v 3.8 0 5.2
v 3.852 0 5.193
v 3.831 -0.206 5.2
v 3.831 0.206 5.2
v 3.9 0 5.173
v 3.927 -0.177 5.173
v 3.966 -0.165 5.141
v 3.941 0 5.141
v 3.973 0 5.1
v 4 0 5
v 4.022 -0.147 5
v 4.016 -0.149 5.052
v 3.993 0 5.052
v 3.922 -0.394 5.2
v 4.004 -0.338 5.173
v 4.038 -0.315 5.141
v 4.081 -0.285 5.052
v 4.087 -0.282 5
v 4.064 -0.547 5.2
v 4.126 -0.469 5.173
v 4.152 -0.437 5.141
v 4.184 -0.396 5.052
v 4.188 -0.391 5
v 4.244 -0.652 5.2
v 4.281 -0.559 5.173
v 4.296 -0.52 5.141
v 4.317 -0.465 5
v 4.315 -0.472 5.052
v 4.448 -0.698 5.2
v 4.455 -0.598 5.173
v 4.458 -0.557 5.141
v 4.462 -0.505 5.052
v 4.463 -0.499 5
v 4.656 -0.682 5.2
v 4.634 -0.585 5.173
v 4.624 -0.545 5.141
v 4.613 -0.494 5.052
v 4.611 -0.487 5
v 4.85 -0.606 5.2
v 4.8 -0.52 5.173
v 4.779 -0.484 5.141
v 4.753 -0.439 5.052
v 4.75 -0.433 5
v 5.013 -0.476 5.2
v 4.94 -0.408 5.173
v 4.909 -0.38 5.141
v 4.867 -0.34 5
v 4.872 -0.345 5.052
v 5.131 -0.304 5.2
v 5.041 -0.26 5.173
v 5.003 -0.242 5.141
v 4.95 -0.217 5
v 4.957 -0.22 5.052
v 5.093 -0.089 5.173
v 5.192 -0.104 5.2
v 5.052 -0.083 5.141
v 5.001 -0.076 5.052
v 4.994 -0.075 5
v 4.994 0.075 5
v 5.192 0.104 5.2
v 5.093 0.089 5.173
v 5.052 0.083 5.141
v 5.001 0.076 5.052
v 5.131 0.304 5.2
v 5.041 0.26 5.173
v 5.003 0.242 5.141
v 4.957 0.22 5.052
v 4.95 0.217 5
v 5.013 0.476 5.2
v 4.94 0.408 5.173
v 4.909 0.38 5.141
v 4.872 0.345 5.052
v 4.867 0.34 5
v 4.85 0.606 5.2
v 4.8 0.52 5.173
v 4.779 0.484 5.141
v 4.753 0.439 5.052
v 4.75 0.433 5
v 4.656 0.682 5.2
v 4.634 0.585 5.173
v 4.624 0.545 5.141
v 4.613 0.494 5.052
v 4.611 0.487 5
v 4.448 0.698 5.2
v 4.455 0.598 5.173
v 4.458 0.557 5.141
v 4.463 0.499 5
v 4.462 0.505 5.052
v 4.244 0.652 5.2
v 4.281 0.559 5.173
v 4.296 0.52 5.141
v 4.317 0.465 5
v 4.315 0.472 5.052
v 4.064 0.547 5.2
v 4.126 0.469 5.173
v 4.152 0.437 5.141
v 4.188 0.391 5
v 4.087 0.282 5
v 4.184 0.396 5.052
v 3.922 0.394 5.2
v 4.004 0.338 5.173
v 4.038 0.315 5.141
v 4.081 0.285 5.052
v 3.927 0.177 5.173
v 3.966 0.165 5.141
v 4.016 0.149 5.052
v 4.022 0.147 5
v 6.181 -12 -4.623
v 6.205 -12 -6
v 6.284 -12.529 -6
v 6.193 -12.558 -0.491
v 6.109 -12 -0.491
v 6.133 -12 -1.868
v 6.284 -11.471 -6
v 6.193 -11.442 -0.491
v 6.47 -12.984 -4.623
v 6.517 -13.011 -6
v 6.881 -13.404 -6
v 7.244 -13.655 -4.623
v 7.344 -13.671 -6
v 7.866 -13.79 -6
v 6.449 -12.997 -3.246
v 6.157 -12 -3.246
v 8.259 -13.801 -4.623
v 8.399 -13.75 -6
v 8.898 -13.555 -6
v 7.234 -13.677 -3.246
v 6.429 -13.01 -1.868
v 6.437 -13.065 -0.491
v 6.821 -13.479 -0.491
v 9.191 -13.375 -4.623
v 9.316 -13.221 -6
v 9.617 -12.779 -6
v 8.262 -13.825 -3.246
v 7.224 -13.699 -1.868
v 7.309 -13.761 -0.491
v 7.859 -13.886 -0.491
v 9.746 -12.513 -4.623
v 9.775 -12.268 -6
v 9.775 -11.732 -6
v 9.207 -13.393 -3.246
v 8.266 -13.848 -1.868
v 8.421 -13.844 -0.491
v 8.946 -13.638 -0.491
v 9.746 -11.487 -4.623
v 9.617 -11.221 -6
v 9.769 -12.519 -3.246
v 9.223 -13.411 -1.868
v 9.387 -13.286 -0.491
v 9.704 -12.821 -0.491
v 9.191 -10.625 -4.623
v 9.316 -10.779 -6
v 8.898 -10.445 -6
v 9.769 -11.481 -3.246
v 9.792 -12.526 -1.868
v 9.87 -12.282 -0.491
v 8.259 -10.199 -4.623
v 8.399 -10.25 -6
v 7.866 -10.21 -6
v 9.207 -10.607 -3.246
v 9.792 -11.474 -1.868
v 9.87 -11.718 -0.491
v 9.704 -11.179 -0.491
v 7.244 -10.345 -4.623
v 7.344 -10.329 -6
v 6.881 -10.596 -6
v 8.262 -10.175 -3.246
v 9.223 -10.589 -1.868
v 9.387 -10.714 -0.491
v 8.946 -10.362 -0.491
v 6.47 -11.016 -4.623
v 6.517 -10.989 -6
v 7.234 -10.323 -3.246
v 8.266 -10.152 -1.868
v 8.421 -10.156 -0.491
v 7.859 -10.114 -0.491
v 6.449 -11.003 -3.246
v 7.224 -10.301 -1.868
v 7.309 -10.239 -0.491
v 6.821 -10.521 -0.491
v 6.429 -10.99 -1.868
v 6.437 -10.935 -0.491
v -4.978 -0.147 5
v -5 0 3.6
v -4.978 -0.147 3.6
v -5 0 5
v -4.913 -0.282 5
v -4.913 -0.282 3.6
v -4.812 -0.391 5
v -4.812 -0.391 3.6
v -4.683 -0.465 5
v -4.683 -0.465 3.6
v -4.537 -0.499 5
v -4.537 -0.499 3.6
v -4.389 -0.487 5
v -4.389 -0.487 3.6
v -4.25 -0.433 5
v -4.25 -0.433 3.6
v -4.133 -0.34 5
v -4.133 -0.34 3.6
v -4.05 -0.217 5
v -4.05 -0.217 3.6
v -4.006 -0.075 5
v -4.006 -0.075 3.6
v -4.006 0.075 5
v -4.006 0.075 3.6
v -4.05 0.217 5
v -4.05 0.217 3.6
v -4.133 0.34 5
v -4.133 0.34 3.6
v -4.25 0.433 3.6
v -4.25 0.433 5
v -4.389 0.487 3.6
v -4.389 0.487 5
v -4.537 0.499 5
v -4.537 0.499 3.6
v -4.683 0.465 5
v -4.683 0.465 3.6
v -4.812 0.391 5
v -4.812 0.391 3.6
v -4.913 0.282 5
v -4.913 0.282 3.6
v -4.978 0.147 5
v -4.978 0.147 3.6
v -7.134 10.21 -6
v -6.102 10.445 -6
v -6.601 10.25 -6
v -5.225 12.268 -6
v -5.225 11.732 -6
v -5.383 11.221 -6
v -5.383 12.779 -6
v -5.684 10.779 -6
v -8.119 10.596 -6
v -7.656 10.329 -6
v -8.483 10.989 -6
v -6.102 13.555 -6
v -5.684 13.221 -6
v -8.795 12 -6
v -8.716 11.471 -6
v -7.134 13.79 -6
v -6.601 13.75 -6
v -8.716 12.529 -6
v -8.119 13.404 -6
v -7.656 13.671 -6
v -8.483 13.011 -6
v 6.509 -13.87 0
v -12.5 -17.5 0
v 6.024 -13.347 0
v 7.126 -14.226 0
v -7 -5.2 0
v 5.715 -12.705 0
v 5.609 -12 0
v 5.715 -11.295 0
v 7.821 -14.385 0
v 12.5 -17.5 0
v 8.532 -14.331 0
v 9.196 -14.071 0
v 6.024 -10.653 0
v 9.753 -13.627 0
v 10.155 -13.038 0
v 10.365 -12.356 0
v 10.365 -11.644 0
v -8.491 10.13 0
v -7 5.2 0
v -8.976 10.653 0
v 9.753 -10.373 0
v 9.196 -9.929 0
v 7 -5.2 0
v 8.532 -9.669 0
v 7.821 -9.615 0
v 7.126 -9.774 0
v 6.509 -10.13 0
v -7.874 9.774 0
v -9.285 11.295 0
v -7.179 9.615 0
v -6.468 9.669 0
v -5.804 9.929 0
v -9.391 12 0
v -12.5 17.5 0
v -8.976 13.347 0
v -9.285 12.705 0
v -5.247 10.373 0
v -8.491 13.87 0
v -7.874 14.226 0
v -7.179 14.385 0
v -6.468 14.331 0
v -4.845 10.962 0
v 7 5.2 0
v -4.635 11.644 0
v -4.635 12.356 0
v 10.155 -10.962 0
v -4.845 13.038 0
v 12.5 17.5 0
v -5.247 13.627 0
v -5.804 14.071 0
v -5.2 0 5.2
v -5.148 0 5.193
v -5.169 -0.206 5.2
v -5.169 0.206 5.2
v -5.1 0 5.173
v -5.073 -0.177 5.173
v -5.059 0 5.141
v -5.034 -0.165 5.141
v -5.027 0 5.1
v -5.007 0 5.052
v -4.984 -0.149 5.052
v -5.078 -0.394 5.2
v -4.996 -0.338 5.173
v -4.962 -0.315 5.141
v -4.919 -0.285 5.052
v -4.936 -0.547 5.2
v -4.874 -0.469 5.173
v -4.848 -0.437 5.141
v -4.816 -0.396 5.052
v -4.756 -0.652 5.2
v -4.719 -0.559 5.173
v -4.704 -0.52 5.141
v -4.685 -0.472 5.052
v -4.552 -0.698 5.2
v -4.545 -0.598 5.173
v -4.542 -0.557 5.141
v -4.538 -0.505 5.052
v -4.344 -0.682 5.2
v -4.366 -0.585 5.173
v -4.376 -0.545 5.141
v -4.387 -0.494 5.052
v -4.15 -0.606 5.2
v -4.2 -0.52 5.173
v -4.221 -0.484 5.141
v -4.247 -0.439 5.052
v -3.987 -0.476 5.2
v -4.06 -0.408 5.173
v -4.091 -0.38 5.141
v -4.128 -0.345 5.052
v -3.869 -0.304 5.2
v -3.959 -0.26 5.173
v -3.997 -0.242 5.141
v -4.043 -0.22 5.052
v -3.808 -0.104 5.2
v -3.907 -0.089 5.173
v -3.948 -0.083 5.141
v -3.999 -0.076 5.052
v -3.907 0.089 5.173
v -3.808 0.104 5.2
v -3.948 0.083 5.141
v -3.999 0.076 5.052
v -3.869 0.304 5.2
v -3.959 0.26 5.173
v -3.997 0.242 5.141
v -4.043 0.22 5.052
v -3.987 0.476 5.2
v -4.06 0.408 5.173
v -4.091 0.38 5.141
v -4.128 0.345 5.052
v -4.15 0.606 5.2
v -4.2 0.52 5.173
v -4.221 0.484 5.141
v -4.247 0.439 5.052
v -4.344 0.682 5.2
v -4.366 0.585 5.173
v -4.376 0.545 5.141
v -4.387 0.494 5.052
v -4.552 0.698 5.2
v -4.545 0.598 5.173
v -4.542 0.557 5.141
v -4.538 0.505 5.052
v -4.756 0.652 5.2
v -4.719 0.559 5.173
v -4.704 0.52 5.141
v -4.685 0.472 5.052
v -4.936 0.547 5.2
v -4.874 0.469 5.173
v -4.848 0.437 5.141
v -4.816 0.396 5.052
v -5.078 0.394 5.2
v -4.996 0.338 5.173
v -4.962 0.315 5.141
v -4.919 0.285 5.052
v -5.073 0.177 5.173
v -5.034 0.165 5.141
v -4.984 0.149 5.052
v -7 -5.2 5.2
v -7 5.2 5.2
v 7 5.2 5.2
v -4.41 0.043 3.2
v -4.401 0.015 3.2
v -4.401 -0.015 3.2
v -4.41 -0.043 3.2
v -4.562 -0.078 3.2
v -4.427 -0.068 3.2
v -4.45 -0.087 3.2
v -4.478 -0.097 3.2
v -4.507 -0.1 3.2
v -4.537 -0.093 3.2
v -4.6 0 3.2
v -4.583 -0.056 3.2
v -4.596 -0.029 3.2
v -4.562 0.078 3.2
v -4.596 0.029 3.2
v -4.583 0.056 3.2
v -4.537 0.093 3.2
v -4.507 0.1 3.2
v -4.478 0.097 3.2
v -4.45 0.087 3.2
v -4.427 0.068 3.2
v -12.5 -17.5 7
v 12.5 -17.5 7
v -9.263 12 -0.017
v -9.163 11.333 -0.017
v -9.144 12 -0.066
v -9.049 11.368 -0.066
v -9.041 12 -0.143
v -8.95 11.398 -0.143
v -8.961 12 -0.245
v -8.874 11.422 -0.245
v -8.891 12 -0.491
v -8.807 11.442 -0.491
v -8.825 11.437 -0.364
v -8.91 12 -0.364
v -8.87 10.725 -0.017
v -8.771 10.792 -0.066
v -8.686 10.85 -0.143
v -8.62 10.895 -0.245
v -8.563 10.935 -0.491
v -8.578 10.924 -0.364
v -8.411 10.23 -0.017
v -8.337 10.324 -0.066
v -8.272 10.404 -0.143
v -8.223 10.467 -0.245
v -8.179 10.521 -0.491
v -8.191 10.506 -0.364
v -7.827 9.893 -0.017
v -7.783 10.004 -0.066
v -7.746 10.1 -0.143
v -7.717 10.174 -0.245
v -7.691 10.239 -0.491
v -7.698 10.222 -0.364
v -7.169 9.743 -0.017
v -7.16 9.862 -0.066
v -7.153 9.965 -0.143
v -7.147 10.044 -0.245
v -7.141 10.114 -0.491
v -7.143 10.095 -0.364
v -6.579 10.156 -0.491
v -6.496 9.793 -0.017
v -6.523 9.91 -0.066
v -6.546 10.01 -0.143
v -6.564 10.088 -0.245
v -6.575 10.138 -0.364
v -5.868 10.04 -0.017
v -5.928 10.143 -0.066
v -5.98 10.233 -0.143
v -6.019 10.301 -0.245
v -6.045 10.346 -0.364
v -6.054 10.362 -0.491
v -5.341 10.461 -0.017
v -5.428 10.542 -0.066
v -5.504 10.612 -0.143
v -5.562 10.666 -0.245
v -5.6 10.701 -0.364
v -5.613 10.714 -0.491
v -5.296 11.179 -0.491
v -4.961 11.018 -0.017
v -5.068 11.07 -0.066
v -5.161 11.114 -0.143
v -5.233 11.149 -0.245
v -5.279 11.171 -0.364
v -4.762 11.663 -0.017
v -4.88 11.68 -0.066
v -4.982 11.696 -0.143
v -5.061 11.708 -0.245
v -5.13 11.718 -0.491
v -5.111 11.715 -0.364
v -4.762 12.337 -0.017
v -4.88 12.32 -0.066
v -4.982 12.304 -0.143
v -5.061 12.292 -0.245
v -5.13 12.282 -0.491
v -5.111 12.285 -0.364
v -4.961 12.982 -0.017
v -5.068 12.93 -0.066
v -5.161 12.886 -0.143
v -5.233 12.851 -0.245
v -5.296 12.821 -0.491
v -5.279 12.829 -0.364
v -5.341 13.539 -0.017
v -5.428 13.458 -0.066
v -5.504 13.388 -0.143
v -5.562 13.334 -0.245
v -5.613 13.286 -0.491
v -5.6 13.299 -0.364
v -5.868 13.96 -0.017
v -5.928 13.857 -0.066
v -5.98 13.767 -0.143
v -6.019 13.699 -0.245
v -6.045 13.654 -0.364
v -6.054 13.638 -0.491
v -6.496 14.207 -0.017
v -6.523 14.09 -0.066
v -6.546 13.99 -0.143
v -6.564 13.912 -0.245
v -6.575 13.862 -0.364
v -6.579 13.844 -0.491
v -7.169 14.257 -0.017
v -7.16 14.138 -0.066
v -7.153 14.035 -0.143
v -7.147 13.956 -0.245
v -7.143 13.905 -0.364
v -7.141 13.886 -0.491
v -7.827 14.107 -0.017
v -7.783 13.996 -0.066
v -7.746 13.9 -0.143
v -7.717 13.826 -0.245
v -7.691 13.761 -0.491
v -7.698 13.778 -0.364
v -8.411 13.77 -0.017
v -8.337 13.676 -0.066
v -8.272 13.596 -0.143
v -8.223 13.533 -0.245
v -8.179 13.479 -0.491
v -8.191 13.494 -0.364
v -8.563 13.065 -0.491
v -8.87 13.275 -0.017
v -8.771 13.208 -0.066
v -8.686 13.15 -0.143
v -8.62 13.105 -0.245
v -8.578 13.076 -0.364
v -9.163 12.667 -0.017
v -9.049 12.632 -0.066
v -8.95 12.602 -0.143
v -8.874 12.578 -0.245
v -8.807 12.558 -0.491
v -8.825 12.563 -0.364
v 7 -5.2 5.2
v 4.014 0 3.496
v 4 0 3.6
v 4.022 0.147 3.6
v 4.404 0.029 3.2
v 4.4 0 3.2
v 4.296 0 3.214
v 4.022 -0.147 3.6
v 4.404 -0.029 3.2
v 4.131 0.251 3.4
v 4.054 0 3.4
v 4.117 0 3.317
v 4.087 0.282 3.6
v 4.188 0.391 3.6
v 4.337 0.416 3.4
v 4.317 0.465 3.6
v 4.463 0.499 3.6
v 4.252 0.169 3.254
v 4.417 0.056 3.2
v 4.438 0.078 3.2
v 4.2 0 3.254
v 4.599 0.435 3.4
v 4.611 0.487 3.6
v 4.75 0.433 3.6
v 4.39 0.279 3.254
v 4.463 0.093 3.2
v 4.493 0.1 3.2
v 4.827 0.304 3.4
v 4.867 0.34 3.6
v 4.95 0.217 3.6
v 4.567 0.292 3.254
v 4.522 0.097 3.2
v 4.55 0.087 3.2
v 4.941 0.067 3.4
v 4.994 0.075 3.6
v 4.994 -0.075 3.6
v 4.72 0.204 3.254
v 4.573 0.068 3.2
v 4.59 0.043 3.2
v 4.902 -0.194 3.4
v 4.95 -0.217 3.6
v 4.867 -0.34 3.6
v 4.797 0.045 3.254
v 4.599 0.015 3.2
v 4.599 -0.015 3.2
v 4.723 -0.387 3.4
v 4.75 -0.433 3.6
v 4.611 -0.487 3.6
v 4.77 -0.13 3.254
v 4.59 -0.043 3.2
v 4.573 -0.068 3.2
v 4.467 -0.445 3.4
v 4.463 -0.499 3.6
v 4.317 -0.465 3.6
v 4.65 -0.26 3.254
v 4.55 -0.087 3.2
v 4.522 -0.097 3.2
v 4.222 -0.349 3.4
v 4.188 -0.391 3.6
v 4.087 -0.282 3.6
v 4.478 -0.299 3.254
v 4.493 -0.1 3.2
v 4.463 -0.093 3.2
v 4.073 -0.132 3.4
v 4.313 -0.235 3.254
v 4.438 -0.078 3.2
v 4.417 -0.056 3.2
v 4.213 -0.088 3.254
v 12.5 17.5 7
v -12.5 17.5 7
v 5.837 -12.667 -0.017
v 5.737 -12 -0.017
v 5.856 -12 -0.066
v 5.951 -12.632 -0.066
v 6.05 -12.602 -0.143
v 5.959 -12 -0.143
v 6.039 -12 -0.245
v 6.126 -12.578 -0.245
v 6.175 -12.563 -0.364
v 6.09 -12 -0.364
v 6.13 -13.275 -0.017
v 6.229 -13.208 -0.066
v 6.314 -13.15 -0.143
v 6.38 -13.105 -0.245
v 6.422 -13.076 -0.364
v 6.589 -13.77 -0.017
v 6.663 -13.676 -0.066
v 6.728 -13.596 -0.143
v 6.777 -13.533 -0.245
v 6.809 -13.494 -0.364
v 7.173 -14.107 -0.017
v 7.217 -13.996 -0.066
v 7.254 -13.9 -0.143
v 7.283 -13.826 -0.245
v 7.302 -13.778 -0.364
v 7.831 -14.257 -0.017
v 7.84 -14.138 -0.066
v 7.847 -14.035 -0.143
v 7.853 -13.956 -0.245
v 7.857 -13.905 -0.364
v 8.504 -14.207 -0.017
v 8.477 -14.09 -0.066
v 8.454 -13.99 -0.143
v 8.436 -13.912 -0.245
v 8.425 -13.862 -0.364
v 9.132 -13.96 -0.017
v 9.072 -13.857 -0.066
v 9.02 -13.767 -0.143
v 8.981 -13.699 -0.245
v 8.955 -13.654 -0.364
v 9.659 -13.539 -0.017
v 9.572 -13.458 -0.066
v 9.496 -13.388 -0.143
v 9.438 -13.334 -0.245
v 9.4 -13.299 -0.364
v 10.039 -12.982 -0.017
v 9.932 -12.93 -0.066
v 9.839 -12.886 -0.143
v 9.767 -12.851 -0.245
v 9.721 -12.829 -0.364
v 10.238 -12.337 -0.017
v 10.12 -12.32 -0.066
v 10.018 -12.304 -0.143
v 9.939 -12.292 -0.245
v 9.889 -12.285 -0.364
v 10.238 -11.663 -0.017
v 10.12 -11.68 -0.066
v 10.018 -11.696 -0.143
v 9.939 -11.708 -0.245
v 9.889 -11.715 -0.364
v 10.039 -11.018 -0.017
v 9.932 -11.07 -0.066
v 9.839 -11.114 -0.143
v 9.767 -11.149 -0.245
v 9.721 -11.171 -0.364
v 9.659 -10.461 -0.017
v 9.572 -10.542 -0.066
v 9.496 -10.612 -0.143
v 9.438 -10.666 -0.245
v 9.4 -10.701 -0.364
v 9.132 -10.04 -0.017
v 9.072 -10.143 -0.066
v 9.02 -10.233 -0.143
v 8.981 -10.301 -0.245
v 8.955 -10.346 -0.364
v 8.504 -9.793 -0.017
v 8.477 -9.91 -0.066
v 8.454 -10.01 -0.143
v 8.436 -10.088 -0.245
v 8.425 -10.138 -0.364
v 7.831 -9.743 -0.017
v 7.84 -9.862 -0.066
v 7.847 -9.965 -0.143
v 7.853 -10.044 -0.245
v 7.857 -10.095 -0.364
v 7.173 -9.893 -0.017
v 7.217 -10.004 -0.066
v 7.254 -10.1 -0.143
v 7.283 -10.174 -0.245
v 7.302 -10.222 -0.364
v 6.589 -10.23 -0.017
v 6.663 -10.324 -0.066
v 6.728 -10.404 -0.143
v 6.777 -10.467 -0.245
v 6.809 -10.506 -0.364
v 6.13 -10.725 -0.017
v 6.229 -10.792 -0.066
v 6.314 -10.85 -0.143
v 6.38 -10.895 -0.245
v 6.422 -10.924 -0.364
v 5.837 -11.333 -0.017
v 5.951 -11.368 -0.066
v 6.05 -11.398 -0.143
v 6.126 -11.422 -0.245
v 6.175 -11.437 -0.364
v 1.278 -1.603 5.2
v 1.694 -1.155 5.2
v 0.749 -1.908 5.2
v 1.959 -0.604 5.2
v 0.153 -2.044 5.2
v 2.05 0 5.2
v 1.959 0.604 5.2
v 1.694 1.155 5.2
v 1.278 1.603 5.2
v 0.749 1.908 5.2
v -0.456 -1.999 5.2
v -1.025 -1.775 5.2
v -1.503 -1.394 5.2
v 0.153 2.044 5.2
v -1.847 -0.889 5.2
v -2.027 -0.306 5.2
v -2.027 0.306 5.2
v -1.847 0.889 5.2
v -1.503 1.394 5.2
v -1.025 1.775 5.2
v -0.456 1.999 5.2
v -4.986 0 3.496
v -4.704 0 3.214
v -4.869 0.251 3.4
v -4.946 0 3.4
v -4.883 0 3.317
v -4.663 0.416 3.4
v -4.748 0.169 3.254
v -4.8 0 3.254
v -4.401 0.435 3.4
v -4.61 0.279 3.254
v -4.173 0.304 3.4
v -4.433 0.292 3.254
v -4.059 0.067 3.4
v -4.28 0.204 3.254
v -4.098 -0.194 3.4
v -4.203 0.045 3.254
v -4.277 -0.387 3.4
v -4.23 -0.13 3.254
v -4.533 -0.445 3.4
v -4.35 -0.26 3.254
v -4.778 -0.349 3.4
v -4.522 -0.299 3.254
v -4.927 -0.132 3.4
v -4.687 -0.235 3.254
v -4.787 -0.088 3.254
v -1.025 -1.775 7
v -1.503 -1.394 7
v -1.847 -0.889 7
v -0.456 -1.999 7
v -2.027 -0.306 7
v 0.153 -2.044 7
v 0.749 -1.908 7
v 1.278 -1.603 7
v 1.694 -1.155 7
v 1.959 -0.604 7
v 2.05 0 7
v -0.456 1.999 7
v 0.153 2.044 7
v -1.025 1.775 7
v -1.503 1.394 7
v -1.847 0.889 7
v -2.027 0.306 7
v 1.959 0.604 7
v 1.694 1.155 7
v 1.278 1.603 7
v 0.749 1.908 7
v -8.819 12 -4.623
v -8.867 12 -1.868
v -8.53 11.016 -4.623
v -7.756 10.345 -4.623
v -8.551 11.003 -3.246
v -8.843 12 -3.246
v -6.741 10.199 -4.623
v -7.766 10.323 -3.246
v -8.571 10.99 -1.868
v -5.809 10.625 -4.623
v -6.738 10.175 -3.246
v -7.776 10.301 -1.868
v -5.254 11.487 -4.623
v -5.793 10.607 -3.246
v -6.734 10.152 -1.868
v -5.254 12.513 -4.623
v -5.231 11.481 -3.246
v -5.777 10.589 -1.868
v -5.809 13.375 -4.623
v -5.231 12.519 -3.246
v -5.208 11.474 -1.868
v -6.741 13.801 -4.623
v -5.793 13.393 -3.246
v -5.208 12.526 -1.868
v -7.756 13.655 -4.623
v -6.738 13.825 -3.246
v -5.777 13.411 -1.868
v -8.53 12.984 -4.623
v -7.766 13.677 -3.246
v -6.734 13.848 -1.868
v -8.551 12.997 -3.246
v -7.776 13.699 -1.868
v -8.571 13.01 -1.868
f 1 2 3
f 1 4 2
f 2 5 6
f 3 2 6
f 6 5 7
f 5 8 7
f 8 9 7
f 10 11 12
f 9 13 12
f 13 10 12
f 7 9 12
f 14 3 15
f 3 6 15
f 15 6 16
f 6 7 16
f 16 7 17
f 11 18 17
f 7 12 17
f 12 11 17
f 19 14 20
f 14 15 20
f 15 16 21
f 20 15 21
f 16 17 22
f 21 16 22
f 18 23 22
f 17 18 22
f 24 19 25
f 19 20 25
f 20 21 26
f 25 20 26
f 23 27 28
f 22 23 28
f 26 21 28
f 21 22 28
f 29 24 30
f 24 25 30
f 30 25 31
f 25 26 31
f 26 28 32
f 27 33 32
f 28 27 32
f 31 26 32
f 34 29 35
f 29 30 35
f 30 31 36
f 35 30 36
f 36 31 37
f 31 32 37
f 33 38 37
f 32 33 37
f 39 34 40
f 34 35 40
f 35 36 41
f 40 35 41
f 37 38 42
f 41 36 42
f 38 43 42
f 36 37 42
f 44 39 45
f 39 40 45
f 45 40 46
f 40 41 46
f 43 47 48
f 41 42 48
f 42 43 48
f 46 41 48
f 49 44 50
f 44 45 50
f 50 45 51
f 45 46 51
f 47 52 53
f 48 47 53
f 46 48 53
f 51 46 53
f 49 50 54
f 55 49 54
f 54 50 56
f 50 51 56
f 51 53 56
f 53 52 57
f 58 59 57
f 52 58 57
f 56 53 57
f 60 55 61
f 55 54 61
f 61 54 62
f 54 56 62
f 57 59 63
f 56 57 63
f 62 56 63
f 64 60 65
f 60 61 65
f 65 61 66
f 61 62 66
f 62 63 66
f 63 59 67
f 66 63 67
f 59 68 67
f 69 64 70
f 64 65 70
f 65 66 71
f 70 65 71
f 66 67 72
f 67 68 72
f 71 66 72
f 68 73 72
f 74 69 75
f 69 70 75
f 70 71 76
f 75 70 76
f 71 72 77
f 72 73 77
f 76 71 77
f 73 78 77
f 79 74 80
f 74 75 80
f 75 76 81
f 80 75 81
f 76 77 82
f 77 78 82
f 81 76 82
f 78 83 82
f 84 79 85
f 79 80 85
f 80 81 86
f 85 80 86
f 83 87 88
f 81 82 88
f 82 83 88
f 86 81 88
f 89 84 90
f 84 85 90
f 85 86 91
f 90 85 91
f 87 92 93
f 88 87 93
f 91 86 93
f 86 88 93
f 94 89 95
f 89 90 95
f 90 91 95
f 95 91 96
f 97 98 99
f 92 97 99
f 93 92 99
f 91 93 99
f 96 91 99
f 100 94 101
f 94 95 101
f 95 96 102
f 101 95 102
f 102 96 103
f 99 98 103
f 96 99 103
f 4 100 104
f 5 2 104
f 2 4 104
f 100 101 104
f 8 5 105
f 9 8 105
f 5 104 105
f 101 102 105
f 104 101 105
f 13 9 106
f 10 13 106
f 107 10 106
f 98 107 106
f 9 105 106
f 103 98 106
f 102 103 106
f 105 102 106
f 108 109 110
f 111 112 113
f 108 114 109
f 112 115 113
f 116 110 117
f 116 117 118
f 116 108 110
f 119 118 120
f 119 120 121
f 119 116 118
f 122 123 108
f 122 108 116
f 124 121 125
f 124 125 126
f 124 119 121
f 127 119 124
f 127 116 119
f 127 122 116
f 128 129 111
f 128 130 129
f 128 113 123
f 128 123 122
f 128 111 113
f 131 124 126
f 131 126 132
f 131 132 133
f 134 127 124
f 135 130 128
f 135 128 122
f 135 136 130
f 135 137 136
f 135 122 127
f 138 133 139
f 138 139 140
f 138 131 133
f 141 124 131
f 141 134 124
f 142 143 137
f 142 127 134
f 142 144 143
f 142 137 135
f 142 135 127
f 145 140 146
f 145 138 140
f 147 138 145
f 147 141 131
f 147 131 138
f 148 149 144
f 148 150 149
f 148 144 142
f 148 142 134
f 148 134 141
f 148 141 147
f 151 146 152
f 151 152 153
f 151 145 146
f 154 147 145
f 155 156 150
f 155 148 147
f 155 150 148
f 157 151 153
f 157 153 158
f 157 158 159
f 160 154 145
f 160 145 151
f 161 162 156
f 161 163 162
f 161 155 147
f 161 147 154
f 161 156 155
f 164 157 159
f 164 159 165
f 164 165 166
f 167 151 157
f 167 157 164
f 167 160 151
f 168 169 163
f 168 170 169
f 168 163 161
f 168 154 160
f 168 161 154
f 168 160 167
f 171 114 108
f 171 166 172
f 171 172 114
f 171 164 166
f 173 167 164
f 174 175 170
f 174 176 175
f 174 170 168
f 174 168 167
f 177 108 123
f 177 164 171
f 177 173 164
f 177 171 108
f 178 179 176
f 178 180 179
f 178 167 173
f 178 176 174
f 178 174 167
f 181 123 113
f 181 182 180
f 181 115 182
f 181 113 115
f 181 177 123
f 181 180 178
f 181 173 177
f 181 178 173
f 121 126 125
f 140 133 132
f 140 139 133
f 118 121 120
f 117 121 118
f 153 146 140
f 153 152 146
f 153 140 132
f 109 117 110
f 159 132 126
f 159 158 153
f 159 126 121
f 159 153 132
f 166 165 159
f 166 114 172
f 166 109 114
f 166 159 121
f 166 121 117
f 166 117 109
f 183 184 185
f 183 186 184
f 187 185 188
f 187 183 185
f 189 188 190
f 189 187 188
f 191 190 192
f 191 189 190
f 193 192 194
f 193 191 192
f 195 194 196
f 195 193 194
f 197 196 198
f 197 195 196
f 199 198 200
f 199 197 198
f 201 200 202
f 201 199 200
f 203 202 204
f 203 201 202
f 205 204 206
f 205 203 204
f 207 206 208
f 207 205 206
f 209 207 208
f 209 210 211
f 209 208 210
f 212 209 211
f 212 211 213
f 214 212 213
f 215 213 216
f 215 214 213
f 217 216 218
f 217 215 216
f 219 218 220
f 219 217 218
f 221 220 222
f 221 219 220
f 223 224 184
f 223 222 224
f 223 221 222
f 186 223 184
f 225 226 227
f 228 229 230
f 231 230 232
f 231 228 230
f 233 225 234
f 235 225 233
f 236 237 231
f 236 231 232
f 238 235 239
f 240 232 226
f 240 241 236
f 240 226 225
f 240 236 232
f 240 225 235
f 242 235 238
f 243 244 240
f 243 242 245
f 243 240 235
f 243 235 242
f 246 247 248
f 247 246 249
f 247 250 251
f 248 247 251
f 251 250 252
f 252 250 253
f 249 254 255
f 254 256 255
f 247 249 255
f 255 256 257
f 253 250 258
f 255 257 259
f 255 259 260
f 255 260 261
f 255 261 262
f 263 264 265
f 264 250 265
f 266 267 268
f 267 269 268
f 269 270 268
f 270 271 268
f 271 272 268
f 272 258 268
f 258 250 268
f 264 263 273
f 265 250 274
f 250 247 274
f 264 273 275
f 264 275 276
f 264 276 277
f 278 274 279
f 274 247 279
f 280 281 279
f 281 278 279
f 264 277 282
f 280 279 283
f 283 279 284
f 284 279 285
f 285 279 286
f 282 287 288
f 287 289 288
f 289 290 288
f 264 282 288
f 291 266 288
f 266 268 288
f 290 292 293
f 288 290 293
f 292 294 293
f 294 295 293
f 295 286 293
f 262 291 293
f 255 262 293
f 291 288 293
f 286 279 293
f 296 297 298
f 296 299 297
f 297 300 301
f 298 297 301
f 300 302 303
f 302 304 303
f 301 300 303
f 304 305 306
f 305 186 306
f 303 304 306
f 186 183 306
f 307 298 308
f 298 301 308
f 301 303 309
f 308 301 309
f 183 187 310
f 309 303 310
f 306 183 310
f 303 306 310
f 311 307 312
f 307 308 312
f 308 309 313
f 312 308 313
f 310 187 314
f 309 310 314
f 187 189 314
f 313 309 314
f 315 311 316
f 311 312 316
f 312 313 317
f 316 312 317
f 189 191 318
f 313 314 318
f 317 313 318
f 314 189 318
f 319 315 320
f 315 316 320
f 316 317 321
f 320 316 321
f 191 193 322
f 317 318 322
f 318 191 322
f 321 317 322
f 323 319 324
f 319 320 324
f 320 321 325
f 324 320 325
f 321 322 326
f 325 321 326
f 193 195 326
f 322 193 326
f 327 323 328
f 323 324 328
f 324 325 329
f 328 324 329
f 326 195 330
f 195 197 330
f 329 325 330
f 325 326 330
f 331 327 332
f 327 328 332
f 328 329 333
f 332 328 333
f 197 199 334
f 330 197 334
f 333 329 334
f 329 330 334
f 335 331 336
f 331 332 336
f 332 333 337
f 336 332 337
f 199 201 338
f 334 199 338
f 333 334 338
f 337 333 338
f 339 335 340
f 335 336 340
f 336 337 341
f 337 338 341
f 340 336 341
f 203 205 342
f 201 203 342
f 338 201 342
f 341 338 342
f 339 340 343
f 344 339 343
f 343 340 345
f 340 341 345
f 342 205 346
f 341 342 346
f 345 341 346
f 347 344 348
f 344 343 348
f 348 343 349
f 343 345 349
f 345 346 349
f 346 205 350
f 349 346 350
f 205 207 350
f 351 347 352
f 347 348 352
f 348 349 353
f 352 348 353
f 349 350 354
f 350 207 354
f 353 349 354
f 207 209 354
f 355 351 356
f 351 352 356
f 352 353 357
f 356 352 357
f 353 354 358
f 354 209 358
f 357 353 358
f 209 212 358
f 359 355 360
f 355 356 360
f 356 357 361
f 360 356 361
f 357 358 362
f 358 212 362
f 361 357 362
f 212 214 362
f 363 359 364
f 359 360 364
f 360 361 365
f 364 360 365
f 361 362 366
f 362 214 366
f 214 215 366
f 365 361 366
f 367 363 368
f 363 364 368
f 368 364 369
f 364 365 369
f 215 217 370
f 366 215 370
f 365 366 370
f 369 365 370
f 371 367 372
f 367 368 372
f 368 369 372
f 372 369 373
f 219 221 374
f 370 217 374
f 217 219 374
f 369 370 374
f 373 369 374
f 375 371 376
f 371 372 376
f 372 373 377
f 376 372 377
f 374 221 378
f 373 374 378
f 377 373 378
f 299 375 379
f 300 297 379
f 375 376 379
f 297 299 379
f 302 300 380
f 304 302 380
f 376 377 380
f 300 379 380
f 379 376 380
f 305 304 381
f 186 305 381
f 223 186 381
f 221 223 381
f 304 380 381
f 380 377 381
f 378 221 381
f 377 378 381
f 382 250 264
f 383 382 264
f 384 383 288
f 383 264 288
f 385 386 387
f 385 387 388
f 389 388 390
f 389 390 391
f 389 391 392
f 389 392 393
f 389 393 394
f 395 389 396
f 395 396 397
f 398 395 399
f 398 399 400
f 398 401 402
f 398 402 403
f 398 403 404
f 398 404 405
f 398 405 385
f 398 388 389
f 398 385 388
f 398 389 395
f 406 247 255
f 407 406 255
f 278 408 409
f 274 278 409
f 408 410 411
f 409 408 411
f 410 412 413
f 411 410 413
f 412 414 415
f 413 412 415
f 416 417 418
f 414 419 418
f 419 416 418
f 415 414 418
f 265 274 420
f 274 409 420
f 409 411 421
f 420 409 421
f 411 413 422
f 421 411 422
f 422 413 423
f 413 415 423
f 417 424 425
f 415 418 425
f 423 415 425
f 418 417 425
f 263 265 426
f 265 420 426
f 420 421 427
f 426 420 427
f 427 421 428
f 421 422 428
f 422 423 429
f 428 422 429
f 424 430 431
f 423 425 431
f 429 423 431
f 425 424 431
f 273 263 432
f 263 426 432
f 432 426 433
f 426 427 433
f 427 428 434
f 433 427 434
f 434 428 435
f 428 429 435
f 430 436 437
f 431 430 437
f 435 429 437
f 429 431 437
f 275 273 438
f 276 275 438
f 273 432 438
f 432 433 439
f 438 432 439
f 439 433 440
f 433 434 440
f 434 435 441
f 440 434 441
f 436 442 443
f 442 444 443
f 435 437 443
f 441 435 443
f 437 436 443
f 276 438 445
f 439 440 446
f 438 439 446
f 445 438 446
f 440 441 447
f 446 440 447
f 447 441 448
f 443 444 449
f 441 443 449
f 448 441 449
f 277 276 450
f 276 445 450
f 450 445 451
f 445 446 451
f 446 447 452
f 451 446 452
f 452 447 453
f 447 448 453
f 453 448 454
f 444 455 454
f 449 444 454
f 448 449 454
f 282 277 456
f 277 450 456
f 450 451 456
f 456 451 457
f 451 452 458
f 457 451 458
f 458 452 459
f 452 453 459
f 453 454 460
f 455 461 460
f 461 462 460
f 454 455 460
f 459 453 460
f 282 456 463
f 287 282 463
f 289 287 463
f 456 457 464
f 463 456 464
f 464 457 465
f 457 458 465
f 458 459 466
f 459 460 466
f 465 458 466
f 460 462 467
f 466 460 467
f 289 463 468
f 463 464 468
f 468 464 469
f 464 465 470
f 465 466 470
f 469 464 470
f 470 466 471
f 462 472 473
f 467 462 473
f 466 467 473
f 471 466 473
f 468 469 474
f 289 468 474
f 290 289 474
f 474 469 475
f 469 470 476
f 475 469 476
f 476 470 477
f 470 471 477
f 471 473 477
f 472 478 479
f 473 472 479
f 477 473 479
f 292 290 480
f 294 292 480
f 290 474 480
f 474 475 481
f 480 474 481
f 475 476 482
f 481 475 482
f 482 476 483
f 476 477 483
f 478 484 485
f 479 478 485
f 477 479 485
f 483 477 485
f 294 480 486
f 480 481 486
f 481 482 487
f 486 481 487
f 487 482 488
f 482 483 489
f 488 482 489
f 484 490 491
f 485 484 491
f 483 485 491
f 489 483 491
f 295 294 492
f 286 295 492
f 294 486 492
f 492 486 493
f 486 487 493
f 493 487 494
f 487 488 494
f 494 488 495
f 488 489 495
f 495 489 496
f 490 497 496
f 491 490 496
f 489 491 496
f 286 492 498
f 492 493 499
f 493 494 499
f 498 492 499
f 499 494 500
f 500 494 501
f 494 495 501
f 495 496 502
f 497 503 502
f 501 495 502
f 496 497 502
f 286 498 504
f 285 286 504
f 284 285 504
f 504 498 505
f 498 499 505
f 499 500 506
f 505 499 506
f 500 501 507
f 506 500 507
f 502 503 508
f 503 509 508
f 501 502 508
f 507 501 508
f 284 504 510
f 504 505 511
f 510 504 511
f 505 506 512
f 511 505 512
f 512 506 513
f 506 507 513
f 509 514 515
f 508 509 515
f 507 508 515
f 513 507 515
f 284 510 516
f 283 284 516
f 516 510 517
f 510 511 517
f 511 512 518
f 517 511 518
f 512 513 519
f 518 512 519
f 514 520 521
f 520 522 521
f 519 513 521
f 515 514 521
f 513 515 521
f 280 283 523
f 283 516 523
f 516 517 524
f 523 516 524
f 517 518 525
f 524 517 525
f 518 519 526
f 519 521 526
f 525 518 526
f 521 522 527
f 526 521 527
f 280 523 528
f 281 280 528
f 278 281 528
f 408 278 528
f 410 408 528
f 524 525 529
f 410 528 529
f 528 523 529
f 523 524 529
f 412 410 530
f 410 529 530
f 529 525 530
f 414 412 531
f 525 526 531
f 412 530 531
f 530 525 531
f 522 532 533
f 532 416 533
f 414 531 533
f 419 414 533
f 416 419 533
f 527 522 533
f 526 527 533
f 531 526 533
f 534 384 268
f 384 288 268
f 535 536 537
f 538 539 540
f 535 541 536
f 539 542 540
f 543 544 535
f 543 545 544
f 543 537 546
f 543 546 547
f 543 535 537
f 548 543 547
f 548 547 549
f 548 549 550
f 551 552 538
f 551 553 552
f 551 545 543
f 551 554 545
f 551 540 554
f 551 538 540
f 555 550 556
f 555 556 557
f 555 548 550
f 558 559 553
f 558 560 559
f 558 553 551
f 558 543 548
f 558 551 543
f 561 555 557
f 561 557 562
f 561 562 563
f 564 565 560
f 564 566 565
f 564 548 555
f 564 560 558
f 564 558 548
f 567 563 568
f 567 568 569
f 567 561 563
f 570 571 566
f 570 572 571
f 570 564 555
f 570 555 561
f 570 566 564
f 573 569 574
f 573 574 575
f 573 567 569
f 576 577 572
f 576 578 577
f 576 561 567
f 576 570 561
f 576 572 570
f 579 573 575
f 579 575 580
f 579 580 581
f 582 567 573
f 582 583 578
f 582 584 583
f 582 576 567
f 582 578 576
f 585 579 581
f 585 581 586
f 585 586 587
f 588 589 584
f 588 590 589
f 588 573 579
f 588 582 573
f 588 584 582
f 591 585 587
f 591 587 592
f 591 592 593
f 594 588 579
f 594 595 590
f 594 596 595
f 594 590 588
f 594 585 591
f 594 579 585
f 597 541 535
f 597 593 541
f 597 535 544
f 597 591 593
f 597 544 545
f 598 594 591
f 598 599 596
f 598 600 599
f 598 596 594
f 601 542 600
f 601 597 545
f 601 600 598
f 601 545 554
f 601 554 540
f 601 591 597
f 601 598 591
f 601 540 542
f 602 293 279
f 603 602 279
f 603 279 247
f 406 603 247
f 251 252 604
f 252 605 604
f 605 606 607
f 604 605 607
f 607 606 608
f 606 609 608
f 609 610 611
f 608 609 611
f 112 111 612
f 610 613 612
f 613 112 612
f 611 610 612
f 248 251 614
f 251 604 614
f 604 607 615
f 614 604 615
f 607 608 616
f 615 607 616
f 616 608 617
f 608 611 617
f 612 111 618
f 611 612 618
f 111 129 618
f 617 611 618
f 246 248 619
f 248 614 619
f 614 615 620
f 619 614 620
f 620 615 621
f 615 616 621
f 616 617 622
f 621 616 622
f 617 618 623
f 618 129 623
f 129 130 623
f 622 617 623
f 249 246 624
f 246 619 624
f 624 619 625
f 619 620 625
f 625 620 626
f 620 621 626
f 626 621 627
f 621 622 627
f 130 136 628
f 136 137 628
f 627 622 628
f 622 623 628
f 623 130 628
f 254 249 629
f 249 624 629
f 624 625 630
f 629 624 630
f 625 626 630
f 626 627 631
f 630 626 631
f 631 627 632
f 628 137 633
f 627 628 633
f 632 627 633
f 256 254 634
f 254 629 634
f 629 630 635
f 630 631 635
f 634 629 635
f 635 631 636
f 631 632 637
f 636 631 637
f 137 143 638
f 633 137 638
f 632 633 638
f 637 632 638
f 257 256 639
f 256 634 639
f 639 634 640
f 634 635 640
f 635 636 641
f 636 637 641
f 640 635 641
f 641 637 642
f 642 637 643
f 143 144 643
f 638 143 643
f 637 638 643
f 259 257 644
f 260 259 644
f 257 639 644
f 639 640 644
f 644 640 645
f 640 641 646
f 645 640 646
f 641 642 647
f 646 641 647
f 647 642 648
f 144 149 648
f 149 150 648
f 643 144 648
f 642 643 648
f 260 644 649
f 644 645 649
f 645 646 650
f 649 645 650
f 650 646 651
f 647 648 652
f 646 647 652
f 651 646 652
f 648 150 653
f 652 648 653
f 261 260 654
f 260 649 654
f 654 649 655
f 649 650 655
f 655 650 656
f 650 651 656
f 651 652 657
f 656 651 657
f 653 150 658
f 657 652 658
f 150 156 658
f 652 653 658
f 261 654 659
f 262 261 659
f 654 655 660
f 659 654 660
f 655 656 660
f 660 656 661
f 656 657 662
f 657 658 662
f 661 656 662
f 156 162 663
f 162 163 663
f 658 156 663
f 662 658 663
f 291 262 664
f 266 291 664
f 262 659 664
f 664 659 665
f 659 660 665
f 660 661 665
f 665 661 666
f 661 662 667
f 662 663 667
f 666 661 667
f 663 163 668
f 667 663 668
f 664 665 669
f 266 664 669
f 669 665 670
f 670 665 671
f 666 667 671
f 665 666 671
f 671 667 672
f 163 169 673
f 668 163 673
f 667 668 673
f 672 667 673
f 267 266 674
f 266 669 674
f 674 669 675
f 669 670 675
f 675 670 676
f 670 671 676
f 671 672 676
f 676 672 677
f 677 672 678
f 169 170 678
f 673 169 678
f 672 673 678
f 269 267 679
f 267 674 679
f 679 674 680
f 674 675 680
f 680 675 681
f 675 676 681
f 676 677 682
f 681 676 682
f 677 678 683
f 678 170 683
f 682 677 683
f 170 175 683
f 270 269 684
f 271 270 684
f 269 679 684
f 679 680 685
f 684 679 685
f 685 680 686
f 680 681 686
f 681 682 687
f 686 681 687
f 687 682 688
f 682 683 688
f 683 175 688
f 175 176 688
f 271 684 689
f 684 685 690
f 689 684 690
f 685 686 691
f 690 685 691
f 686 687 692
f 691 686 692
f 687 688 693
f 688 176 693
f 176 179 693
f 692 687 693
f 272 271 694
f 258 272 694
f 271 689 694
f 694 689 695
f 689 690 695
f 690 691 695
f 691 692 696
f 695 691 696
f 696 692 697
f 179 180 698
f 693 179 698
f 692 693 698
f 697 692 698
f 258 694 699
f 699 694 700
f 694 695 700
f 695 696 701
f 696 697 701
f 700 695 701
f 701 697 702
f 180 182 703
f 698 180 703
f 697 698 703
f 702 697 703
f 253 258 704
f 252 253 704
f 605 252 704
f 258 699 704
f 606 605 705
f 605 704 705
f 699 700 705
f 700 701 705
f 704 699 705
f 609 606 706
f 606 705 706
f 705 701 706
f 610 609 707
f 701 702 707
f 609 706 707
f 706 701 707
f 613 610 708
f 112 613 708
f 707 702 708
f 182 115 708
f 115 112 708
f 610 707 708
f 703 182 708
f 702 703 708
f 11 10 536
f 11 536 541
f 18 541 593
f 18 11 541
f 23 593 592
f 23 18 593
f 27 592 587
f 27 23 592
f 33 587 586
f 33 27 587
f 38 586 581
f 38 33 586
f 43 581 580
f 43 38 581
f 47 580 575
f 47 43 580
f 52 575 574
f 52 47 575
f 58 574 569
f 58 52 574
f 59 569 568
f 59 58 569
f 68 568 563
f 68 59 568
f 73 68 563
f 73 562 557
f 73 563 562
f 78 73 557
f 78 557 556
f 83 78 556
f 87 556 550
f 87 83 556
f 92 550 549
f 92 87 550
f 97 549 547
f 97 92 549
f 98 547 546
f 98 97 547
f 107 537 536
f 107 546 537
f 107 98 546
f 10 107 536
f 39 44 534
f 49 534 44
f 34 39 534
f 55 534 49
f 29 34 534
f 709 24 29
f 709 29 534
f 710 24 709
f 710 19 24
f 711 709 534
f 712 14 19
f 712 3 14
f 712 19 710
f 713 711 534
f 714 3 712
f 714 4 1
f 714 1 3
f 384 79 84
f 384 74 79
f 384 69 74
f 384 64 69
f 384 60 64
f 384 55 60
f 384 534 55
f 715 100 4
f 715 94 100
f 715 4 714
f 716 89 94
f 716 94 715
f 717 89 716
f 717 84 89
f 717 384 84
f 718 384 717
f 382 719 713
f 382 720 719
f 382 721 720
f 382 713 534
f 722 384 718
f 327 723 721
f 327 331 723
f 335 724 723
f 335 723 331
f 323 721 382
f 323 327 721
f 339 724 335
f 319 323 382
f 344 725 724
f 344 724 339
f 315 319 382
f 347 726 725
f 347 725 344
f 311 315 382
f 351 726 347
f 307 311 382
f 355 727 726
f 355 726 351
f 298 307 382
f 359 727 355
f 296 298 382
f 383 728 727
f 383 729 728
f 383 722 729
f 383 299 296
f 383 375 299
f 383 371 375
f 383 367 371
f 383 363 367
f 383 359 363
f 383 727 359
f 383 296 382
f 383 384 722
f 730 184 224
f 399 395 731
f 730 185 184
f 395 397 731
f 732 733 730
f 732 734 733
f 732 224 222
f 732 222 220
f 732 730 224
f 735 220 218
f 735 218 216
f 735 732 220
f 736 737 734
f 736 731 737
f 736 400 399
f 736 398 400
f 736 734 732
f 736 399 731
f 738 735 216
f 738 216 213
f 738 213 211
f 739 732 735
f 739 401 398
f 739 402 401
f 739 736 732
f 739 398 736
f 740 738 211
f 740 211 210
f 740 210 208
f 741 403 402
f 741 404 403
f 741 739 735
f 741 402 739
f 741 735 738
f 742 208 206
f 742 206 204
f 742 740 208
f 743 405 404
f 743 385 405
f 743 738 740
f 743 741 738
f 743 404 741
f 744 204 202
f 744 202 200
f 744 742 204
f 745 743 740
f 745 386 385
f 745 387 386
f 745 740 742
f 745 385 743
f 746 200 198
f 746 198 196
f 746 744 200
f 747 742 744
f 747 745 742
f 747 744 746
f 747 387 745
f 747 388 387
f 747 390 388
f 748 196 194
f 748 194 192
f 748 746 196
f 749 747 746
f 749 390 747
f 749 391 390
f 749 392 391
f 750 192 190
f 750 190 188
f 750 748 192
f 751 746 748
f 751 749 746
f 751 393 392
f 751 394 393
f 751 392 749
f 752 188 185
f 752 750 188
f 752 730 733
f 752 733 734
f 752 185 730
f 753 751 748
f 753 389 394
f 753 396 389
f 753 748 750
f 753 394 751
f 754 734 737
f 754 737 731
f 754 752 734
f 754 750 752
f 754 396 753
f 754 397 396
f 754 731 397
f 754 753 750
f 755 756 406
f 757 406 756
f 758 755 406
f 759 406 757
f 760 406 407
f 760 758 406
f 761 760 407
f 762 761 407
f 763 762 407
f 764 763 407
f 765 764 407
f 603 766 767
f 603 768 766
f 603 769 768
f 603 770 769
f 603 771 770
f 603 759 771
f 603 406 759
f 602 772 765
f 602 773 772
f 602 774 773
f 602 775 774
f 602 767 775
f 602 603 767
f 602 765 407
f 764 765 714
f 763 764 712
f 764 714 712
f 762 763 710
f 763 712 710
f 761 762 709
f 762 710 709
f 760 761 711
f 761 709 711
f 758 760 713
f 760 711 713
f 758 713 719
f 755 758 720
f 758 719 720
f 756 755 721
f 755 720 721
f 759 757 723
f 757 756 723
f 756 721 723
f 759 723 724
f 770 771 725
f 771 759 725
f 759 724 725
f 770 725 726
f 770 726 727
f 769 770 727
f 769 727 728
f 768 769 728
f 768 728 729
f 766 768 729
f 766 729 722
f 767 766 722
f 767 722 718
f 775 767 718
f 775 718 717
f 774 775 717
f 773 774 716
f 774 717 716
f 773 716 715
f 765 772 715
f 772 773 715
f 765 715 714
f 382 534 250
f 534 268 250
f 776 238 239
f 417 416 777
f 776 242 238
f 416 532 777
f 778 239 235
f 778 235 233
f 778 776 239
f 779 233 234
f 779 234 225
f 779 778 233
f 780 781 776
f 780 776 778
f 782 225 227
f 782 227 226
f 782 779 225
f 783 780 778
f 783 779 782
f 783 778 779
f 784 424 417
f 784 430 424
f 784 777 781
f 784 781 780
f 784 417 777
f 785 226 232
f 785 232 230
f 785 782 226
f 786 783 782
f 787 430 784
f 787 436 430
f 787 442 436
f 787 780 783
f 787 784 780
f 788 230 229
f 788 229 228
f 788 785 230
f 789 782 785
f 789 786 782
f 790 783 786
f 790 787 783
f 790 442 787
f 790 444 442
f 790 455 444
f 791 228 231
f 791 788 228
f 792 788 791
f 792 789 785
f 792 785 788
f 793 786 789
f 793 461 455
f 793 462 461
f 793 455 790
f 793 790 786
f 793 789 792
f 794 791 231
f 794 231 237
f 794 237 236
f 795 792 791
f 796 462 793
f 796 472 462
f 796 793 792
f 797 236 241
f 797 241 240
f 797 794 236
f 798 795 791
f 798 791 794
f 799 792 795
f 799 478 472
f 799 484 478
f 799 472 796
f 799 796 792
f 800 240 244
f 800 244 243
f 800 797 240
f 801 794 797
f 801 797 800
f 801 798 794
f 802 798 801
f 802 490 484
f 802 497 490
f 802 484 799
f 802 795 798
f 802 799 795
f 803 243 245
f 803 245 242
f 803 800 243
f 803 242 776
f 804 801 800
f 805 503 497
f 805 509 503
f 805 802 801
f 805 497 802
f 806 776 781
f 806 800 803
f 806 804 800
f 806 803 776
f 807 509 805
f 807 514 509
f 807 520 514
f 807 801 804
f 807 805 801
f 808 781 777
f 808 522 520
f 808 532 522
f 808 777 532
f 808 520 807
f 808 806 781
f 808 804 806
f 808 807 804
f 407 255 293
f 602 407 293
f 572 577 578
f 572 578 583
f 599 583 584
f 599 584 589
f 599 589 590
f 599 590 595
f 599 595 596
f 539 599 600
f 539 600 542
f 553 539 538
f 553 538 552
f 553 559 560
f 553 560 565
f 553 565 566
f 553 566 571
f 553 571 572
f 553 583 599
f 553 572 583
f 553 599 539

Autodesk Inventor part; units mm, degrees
ref_plane "YZ Plane" through (0, 0, 0) normal (1, 0, 0) x (0, 1, 0)
ref_plane "XZ Plane" through (0, 0, 0) normal (0, 1, 0) x (-1, 0, 0)
ref_plane "XY Plane" through (0, 0, 0) normal (0, 0, 1) x (1, 0, 0)
sketch "Sketch1" plane through (0, 0, 0) normal (0, 0, 1) x (1, 0, 0)
  line L0 (-12.5, -17.5) -> (12.5, -17.5) projected
  line L1 (12.5, -17.5) -> (12.5, 17.5) projected
  line L2 (-12.5, 17.5) -> (-12.5, -17.5) projected
  line L3 (12.5, 17.5) -> (-12.5, 17.5) projected
  circle A0 centre (0, 0) radius 2.05
  dimension "d0" = 4.1
extrude "Extrusion1" add sketch "Sketch1" along normal blind 7
sketch "Sketch2" plane through (0, 0, 0) normal (0, 0, -1) x (-1, 0, 0)
  circle A0 centre (-8, -12) radius 2.1 projected
  circle A1 centre (7, 12) radius 2.1 projected
  circle A2 centre (-8, -12) radius 1.9
  circle A3 centre (7, 12) radius 1.9
  dimension "d9" = 3.8
extrude "Extrusion3" add sketch "Sketch2" along normal blind 6 draft -1 contours A2 | A3
sketch "Sketch3" plane through (0, 0, 0) normal (0, 0, -1) x (-1, 0, 0)
  line L0 (5.5902, -5) -> (-5.5902, -5) construction
  line L1 (-5.5902, 5) -> (5.5902, 5) construction
  line L2 (-7, -5.2) -> (7, -5.2)
  line L3 (7, -5.2) -> (7, 5.2)
  line L4 (7, 5.2) -> (-7, 5.2)
  line L5 (-7, 5.2) -> (-7, -5.2)
  line L6 (-6, -4.5) -> (-6, 4.5) construction
  line L7 (6, 4.5) -> (6, -4.5) construction
  line L8 (-5.5902, 5) -> (5.5902, 5) projected
  line L9 (5.5902, -5) -> (-5.5902, -5) projected
  dimension "d28" = 1
  dimension "d29" = 1
  dimension "d30" = 0.2
  dimension "d31" = 0.2
extrude "Extrusion4" cut sketch "Sketch3" against normal blind 5.2
sketch "Sketch4" plane through (0, 0, 5.2) normal (0, 0, -1) x (-1, 0, 0)
  circle A0 centre (-4.5, 0) radius 0.6105 projected
  circle A1 centre (4.5, 0) radius 0.6105 projected
  circle A2 centre (-4.5, 0) radius 0.5
  circle A3 centre (4.5, 0) radius 0.5
  point P0 (0, 0)
  dimension "d18" = 1
extrude "Extrusion5" add sketch "Sketch4" along normal blind 2 contours A2 | A3
fillet "Fillet1" radius 0.2 2 edges at (-4, 0, 5.2) (5, 0, 5.2)
fillet "Fillet2" radius 0.4 2 edges at (-4, 0, 3.2) (5, 0, 3.2)
fillet "Fillet3" radius 0.5 2 edges at (-5.1, 12, 0) (9.9, -12, 0)
properties part number "Base-Cover" material "Polycarbonate, Clear"
